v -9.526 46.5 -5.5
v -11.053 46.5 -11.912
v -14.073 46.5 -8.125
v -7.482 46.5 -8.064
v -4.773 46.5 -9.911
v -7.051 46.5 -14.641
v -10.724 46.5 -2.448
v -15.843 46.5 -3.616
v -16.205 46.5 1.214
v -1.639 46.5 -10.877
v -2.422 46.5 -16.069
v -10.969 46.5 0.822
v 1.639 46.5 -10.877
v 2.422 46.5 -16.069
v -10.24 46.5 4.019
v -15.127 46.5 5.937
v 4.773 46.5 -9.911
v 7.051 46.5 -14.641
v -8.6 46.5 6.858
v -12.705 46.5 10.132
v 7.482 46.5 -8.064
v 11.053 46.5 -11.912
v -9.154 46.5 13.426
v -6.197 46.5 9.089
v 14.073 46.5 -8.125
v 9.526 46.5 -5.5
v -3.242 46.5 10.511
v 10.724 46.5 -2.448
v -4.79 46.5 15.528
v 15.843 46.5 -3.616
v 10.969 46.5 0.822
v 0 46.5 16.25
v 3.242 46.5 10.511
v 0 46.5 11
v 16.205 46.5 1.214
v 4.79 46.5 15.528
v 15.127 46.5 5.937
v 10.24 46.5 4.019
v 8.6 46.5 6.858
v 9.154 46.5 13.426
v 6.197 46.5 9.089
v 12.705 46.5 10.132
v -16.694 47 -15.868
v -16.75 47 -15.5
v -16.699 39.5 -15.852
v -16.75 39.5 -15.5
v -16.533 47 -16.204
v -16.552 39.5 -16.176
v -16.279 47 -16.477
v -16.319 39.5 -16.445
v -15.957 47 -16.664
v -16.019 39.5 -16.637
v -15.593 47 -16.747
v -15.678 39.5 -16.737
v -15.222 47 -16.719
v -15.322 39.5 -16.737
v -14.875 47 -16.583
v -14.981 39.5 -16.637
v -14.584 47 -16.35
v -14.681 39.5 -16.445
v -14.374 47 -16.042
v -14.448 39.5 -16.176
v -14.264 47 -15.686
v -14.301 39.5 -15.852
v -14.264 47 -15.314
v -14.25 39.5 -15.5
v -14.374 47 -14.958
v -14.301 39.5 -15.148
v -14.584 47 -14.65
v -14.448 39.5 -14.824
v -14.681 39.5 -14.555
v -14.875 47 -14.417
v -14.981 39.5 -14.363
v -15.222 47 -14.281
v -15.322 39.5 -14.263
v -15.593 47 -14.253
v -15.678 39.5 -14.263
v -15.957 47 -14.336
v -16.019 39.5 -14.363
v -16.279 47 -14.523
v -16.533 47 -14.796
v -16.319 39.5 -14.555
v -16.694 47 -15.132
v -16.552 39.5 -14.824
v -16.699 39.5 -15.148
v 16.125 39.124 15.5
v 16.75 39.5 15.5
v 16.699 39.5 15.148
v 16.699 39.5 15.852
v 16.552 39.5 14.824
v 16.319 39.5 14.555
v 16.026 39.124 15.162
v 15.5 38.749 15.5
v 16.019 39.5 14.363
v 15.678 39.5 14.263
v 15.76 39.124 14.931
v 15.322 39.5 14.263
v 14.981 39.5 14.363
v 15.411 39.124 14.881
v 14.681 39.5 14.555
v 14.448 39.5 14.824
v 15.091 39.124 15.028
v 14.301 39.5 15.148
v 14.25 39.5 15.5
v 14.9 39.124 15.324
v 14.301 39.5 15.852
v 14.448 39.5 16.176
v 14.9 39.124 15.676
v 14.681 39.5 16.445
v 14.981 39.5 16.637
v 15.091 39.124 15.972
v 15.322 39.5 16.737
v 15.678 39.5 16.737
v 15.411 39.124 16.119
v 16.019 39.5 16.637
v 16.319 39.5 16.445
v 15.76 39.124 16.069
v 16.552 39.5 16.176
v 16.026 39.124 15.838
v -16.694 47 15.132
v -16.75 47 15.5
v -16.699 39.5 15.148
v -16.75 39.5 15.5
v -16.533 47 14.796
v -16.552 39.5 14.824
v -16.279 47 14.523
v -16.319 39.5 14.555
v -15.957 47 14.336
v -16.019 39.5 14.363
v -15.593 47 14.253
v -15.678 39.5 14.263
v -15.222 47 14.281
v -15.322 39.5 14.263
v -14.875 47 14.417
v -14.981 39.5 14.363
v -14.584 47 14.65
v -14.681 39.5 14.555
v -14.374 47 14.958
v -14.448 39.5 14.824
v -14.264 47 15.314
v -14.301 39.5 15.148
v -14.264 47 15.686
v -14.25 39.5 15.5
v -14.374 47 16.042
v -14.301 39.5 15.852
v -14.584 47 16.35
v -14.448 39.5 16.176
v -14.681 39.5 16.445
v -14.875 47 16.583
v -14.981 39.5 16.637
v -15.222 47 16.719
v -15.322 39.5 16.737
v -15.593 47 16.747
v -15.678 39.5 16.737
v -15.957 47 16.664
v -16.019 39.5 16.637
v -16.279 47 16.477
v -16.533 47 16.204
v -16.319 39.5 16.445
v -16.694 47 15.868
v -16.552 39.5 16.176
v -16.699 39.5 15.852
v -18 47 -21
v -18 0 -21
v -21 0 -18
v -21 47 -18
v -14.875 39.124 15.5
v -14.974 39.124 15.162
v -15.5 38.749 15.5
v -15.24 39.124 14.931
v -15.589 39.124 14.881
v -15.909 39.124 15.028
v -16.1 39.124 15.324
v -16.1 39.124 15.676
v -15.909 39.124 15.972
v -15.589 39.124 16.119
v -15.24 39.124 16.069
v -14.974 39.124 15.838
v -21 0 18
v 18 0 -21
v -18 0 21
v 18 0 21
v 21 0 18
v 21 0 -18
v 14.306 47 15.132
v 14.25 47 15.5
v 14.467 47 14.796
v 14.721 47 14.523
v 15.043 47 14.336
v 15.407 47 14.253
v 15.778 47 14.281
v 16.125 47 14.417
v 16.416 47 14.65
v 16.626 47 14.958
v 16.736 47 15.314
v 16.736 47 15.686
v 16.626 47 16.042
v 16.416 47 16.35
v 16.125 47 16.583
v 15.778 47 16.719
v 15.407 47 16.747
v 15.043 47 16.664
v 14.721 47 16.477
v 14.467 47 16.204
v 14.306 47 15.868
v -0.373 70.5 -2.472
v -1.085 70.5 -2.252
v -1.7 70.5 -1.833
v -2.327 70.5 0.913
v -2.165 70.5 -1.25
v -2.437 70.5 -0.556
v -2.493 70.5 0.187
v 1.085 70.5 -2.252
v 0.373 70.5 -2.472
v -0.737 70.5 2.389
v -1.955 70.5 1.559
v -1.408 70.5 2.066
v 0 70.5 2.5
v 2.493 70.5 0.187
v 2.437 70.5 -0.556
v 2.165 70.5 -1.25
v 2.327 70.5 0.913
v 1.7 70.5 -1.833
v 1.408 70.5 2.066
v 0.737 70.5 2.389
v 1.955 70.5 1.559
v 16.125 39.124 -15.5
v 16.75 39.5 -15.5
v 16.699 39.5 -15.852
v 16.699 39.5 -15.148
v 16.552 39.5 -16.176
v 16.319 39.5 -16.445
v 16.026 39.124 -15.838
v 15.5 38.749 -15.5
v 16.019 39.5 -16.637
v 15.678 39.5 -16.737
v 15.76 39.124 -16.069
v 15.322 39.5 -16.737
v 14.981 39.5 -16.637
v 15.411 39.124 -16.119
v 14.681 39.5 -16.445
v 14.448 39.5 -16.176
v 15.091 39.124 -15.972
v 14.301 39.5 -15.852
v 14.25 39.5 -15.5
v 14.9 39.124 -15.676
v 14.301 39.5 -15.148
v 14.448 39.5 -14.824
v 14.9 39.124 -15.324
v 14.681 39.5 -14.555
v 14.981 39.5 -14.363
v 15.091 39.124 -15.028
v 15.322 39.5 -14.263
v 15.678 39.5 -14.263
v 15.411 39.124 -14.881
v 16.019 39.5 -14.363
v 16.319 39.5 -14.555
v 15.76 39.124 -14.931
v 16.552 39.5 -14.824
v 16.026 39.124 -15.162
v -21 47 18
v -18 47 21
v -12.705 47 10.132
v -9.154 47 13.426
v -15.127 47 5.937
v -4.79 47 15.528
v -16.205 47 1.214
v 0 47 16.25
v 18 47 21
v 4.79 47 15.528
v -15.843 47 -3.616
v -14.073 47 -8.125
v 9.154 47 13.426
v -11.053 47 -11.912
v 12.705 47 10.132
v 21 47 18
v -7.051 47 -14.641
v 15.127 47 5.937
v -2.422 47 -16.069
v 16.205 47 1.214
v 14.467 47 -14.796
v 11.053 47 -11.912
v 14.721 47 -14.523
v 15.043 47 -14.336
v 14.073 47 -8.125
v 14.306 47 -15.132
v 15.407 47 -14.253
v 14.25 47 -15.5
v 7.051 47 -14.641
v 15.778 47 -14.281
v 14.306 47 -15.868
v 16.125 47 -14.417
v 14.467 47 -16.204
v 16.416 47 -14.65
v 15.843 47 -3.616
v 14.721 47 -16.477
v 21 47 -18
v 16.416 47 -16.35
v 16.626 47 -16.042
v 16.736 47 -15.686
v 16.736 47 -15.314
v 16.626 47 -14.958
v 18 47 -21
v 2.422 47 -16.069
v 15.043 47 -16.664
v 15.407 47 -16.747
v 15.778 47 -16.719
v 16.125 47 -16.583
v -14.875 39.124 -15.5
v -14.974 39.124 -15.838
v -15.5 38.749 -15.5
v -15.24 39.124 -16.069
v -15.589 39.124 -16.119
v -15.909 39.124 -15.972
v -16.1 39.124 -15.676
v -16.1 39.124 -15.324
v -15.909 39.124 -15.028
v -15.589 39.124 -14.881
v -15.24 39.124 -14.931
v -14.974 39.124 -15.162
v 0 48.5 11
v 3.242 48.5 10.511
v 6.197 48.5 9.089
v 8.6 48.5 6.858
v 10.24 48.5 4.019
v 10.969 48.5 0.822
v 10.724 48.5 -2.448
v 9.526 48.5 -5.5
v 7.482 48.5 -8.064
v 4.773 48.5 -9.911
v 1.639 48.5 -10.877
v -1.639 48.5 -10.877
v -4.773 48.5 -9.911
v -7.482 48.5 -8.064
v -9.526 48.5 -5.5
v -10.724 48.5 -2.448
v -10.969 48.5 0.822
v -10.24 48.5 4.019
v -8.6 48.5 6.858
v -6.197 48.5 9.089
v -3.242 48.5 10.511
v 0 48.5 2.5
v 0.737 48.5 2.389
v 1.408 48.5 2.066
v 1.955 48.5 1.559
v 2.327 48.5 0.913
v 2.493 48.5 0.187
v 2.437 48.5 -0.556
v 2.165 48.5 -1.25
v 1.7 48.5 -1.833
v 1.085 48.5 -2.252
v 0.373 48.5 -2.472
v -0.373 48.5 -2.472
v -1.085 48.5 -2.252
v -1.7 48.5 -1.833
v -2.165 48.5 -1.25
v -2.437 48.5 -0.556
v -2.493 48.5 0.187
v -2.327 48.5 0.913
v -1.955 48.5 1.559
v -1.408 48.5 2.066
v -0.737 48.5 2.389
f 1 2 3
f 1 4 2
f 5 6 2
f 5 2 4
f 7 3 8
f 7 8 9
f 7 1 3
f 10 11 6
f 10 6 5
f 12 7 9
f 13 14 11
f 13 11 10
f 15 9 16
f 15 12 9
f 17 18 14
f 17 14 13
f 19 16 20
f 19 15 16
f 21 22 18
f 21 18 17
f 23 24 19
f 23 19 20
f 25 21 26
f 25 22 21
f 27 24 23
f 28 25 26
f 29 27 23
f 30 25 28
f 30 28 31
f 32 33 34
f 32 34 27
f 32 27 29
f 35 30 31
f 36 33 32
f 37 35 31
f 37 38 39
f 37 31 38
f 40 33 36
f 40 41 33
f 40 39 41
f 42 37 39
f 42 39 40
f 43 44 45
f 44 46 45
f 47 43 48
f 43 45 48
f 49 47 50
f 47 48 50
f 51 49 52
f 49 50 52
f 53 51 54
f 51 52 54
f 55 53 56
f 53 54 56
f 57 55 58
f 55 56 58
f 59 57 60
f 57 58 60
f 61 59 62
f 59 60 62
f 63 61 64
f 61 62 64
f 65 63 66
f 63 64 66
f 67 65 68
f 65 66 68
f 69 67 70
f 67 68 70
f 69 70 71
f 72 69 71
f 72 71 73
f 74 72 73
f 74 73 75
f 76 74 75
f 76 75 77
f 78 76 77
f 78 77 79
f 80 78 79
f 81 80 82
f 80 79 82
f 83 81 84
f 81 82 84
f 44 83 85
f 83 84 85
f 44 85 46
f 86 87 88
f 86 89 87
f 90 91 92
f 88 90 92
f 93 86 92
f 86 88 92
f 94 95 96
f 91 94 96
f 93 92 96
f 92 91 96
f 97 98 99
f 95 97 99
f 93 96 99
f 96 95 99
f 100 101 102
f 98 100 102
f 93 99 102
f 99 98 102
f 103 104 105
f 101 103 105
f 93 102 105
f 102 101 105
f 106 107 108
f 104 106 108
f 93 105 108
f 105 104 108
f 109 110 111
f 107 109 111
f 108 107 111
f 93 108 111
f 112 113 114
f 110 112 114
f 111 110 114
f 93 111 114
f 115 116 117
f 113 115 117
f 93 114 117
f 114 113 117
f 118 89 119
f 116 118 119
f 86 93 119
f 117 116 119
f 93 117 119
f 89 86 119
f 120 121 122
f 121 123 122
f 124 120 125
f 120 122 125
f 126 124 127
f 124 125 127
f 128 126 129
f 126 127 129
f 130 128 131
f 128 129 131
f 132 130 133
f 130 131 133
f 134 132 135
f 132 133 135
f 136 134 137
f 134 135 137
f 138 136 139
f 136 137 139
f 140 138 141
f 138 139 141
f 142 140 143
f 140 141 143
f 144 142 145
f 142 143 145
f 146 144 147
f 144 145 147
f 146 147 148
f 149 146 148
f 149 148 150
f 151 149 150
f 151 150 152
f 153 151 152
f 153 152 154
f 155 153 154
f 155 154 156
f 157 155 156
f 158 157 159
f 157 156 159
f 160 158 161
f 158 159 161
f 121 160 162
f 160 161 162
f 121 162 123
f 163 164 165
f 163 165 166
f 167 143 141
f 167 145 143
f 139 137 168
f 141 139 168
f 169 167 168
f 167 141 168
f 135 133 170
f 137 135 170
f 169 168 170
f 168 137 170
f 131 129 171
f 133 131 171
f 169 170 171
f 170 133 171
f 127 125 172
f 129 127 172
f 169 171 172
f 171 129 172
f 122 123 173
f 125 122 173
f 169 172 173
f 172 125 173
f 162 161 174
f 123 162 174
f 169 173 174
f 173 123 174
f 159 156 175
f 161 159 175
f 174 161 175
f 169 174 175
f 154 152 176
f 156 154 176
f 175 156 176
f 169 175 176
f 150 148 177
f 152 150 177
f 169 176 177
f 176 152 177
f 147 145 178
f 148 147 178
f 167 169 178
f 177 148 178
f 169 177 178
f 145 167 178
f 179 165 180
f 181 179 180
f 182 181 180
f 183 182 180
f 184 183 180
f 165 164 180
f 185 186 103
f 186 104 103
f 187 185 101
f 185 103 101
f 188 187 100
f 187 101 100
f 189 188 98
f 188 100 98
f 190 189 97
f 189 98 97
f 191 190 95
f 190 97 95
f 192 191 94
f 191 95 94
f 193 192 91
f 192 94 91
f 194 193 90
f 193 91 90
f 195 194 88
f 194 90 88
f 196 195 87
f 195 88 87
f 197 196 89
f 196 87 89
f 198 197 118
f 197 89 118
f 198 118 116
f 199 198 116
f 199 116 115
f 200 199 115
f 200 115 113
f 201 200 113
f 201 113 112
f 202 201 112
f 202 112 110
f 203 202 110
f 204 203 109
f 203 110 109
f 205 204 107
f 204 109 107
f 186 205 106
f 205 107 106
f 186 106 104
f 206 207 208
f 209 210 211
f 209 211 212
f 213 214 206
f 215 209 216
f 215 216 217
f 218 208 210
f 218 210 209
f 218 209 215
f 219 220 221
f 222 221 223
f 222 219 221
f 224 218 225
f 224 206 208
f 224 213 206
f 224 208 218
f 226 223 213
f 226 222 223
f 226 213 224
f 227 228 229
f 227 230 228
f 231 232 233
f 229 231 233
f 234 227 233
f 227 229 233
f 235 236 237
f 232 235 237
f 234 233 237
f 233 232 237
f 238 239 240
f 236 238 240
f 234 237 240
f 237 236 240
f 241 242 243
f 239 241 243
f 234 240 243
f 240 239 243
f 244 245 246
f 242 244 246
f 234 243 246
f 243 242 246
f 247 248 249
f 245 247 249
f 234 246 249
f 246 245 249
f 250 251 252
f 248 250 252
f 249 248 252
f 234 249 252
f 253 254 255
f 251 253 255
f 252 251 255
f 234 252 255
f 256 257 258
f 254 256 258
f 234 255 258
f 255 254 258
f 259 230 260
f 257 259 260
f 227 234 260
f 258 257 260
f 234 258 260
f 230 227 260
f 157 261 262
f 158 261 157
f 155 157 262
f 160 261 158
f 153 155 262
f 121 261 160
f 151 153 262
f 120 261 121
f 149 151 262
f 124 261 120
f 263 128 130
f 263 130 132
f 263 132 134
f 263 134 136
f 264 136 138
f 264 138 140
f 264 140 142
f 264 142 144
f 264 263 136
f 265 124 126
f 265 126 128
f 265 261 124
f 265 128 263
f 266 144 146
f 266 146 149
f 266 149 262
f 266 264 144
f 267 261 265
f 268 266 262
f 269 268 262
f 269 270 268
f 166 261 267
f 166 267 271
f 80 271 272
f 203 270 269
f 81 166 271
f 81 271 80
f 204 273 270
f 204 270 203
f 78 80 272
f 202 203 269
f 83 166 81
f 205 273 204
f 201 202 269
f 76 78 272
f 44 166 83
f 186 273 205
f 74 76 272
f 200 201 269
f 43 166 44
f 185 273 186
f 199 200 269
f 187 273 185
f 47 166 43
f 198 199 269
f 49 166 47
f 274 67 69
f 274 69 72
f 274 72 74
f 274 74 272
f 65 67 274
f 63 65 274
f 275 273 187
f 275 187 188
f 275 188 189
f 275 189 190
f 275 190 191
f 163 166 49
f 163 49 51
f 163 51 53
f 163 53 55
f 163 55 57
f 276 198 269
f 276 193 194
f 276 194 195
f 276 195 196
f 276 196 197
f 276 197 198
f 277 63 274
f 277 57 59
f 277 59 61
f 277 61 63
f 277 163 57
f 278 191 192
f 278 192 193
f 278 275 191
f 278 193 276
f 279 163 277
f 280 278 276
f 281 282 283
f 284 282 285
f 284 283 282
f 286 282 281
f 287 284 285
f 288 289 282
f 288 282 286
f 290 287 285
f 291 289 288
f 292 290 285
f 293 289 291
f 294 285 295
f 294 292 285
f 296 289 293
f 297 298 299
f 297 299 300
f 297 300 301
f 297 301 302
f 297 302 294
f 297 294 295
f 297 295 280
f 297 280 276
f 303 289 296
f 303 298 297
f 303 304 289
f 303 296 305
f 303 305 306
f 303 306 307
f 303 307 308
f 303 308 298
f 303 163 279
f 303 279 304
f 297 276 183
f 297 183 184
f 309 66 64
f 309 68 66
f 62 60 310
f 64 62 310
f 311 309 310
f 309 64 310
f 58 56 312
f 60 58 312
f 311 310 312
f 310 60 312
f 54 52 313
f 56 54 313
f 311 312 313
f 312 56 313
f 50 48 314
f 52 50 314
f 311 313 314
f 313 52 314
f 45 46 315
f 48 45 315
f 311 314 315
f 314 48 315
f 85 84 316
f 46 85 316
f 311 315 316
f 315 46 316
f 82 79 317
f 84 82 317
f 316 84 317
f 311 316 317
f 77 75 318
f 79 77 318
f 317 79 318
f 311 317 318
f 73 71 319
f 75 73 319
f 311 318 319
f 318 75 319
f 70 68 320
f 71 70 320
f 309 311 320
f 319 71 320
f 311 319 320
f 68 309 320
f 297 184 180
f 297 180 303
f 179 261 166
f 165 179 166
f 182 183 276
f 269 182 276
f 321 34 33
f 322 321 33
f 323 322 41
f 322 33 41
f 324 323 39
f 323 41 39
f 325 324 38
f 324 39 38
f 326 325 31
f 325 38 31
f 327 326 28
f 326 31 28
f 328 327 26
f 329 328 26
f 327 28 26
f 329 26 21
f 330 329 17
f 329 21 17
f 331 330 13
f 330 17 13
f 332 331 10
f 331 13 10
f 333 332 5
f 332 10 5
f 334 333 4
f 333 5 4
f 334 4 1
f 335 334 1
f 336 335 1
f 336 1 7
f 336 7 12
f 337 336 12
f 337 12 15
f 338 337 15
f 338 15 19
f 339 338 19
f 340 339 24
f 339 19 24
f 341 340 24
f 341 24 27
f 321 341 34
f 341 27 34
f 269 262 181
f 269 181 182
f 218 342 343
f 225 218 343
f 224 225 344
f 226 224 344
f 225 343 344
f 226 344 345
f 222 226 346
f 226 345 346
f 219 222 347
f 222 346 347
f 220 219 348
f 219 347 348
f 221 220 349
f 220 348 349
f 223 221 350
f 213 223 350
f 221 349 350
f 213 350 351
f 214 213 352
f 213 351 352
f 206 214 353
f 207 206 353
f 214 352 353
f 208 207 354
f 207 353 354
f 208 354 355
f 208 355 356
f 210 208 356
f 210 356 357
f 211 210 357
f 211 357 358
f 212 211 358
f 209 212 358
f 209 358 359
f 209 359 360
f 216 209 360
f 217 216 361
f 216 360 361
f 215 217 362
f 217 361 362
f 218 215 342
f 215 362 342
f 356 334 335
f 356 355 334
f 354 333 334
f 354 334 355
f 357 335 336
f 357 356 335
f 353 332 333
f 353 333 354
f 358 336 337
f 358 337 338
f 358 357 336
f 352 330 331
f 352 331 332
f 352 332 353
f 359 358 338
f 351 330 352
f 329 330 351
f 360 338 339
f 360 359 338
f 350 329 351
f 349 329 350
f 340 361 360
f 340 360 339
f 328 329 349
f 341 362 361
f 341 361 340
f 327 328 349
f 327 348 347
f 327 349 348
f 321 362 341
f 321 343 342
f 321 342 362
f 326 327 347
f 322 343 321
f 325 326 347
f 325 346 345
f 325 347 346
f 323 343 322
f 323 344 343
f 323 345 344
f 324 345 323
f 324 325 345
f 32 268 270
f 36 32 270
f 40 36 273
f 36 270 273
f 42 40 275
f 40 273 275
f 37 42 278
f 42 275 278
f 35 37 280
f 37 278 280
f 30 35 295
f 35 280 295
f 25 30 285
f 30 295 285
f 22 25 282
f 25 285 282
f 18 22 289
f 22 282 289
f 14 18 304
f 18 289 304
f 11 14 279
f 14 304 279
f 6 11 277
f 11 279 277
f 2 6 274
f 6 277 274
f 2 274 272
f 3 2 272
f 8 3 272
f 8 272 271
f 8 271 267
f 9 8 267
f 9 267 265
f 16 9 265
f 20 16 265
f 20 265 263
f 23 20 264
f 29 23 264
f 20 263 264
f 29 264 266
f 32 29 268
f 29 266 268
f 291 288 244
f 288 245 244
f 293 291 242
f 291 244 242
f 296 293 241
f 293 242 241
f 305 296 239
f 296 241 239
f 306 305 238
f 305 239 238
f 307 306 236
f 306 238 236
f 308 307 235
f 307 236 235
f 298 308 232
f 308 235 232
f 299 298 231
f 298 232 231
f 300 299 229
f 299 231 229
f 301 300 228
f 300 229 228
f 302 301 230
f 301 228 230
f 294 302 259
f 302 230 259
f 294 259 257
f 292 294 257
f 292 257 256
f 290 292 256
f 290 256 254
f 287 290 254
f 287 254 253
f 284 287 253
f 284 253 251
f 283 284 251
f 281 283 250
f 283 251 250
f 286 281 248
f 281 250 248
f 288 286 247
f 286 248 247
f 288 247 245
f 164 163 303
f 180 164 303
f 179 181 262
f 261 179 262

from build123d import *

# Parameters (mm, degrees)
SKETCH_1_W             = 42
SKETCH_1_H             = 42
EXTRUDE_1_DEPTH        = 47
SKETCH_2_R             = 16.25
CUT_EXTRUDE_1_DEPTH    = 0.5
SKETCH_3_R             = 11
EXTRUDE_2_DEPTH        = 2
SKETCH_4_R             = 2.5
EXTRUDE_3_DEPTH        = 22
CHAMFER_1_SIZE         = 3
HOLE_WIZARD_M3_1_D     = 2.5
HOLE_WIZARD_M3_1_DEPTH = 7.5
HOLE_WIZARD_M3_1_TIP   = 0.751075774


with BuildPart() as part:
    # 草圖1 → 填料-伸長1 (new body)
    with BuildSketch(Plane(origin=(0, 0, 0), x_dir=(1, 0, 0), z_dir=(0, 1, 0))):
        Rectangle(SKETCH_1_W, SKETCH_1_H)
    extrude(amount=EXTRUDE_1_DEPTH)

    # 草圖2 → 除料-伸長1 (cut)
    with BuildSketch(Plane(origin=(0, 47, 0), x_dir=(1, 0, 0), z_dir=(0, 1, 0))):
        with Locations(Location((0, 0, 0), (0, 0, 270))):
            Circle(SKETCH_2_R)
    extrude(amount=-CUT_EXTRUDE_1_DEPTH, mode=Mode.SUBTRACT)

    # 草圖3 → 填料-伸長2 (add)
    with BuildSketch(Plane(origin=(0, 46.5, 0), x_dir=(1, 0, 0), z_dir=(0, 1, 0))):
        with Locations(Location((0, 0, 0), (0, 0, 270))):
            Circle(SKETCH_3_R)
    extrude(amount=EXTRUDE_2_DEPTH)

    # 草圖4 → 填料-伸長3 (add)
    with BuildSketch(Plane(origin=(0, 48.5, 0), x_dir=(1, 0, 0), z_dir=(0, 1, 0))):
        with Locations(Location((0, 0, 0), (0, 0, 270))):
            Circle(SKETCH_4_R)
    extrude(amount=EXTRUDE_3_DEPTH)

    # 導角1
    chamfer_1_edges = [part.edges().sort_by_distance(p)[0] for p in [
        (21, 23.5, 21),
        (-21, 23.5, 21),
        (-21, 23.5, -21),
        (21, 23.5, -21),
    ]]
    chamfer(chamfer_1_edges, length=CHAMFER_1_SIZE)

    # M3 螺紋孔1
    with Locations(Plane(origin=(0, 47, 0), x_dir=(1, 0, 0), z_dir=(0, 1, 0))):
        with Locations((-15.5, 15.5), (-15.5, -15.5), (15.5, 15.5), (15.5, -15.5)):
            Hole(HOLE_WIZARD_M3_1_D / 2, depth=HOLE_WIZARD_M3_1_DEPTH)
            with Locations((0, 0, -(HOLE_WIZARD_M3_1_DEPTH + HOLE_WIZARD_M3_1_TIP / 2))):  # 118° drill point
                Cone(0, HOLE_WIZARD_M3_1_D / 2, HOLE_WIZARD_M3_1_TIP, mode=Mode.SUBTRACT)


solid = part.part
